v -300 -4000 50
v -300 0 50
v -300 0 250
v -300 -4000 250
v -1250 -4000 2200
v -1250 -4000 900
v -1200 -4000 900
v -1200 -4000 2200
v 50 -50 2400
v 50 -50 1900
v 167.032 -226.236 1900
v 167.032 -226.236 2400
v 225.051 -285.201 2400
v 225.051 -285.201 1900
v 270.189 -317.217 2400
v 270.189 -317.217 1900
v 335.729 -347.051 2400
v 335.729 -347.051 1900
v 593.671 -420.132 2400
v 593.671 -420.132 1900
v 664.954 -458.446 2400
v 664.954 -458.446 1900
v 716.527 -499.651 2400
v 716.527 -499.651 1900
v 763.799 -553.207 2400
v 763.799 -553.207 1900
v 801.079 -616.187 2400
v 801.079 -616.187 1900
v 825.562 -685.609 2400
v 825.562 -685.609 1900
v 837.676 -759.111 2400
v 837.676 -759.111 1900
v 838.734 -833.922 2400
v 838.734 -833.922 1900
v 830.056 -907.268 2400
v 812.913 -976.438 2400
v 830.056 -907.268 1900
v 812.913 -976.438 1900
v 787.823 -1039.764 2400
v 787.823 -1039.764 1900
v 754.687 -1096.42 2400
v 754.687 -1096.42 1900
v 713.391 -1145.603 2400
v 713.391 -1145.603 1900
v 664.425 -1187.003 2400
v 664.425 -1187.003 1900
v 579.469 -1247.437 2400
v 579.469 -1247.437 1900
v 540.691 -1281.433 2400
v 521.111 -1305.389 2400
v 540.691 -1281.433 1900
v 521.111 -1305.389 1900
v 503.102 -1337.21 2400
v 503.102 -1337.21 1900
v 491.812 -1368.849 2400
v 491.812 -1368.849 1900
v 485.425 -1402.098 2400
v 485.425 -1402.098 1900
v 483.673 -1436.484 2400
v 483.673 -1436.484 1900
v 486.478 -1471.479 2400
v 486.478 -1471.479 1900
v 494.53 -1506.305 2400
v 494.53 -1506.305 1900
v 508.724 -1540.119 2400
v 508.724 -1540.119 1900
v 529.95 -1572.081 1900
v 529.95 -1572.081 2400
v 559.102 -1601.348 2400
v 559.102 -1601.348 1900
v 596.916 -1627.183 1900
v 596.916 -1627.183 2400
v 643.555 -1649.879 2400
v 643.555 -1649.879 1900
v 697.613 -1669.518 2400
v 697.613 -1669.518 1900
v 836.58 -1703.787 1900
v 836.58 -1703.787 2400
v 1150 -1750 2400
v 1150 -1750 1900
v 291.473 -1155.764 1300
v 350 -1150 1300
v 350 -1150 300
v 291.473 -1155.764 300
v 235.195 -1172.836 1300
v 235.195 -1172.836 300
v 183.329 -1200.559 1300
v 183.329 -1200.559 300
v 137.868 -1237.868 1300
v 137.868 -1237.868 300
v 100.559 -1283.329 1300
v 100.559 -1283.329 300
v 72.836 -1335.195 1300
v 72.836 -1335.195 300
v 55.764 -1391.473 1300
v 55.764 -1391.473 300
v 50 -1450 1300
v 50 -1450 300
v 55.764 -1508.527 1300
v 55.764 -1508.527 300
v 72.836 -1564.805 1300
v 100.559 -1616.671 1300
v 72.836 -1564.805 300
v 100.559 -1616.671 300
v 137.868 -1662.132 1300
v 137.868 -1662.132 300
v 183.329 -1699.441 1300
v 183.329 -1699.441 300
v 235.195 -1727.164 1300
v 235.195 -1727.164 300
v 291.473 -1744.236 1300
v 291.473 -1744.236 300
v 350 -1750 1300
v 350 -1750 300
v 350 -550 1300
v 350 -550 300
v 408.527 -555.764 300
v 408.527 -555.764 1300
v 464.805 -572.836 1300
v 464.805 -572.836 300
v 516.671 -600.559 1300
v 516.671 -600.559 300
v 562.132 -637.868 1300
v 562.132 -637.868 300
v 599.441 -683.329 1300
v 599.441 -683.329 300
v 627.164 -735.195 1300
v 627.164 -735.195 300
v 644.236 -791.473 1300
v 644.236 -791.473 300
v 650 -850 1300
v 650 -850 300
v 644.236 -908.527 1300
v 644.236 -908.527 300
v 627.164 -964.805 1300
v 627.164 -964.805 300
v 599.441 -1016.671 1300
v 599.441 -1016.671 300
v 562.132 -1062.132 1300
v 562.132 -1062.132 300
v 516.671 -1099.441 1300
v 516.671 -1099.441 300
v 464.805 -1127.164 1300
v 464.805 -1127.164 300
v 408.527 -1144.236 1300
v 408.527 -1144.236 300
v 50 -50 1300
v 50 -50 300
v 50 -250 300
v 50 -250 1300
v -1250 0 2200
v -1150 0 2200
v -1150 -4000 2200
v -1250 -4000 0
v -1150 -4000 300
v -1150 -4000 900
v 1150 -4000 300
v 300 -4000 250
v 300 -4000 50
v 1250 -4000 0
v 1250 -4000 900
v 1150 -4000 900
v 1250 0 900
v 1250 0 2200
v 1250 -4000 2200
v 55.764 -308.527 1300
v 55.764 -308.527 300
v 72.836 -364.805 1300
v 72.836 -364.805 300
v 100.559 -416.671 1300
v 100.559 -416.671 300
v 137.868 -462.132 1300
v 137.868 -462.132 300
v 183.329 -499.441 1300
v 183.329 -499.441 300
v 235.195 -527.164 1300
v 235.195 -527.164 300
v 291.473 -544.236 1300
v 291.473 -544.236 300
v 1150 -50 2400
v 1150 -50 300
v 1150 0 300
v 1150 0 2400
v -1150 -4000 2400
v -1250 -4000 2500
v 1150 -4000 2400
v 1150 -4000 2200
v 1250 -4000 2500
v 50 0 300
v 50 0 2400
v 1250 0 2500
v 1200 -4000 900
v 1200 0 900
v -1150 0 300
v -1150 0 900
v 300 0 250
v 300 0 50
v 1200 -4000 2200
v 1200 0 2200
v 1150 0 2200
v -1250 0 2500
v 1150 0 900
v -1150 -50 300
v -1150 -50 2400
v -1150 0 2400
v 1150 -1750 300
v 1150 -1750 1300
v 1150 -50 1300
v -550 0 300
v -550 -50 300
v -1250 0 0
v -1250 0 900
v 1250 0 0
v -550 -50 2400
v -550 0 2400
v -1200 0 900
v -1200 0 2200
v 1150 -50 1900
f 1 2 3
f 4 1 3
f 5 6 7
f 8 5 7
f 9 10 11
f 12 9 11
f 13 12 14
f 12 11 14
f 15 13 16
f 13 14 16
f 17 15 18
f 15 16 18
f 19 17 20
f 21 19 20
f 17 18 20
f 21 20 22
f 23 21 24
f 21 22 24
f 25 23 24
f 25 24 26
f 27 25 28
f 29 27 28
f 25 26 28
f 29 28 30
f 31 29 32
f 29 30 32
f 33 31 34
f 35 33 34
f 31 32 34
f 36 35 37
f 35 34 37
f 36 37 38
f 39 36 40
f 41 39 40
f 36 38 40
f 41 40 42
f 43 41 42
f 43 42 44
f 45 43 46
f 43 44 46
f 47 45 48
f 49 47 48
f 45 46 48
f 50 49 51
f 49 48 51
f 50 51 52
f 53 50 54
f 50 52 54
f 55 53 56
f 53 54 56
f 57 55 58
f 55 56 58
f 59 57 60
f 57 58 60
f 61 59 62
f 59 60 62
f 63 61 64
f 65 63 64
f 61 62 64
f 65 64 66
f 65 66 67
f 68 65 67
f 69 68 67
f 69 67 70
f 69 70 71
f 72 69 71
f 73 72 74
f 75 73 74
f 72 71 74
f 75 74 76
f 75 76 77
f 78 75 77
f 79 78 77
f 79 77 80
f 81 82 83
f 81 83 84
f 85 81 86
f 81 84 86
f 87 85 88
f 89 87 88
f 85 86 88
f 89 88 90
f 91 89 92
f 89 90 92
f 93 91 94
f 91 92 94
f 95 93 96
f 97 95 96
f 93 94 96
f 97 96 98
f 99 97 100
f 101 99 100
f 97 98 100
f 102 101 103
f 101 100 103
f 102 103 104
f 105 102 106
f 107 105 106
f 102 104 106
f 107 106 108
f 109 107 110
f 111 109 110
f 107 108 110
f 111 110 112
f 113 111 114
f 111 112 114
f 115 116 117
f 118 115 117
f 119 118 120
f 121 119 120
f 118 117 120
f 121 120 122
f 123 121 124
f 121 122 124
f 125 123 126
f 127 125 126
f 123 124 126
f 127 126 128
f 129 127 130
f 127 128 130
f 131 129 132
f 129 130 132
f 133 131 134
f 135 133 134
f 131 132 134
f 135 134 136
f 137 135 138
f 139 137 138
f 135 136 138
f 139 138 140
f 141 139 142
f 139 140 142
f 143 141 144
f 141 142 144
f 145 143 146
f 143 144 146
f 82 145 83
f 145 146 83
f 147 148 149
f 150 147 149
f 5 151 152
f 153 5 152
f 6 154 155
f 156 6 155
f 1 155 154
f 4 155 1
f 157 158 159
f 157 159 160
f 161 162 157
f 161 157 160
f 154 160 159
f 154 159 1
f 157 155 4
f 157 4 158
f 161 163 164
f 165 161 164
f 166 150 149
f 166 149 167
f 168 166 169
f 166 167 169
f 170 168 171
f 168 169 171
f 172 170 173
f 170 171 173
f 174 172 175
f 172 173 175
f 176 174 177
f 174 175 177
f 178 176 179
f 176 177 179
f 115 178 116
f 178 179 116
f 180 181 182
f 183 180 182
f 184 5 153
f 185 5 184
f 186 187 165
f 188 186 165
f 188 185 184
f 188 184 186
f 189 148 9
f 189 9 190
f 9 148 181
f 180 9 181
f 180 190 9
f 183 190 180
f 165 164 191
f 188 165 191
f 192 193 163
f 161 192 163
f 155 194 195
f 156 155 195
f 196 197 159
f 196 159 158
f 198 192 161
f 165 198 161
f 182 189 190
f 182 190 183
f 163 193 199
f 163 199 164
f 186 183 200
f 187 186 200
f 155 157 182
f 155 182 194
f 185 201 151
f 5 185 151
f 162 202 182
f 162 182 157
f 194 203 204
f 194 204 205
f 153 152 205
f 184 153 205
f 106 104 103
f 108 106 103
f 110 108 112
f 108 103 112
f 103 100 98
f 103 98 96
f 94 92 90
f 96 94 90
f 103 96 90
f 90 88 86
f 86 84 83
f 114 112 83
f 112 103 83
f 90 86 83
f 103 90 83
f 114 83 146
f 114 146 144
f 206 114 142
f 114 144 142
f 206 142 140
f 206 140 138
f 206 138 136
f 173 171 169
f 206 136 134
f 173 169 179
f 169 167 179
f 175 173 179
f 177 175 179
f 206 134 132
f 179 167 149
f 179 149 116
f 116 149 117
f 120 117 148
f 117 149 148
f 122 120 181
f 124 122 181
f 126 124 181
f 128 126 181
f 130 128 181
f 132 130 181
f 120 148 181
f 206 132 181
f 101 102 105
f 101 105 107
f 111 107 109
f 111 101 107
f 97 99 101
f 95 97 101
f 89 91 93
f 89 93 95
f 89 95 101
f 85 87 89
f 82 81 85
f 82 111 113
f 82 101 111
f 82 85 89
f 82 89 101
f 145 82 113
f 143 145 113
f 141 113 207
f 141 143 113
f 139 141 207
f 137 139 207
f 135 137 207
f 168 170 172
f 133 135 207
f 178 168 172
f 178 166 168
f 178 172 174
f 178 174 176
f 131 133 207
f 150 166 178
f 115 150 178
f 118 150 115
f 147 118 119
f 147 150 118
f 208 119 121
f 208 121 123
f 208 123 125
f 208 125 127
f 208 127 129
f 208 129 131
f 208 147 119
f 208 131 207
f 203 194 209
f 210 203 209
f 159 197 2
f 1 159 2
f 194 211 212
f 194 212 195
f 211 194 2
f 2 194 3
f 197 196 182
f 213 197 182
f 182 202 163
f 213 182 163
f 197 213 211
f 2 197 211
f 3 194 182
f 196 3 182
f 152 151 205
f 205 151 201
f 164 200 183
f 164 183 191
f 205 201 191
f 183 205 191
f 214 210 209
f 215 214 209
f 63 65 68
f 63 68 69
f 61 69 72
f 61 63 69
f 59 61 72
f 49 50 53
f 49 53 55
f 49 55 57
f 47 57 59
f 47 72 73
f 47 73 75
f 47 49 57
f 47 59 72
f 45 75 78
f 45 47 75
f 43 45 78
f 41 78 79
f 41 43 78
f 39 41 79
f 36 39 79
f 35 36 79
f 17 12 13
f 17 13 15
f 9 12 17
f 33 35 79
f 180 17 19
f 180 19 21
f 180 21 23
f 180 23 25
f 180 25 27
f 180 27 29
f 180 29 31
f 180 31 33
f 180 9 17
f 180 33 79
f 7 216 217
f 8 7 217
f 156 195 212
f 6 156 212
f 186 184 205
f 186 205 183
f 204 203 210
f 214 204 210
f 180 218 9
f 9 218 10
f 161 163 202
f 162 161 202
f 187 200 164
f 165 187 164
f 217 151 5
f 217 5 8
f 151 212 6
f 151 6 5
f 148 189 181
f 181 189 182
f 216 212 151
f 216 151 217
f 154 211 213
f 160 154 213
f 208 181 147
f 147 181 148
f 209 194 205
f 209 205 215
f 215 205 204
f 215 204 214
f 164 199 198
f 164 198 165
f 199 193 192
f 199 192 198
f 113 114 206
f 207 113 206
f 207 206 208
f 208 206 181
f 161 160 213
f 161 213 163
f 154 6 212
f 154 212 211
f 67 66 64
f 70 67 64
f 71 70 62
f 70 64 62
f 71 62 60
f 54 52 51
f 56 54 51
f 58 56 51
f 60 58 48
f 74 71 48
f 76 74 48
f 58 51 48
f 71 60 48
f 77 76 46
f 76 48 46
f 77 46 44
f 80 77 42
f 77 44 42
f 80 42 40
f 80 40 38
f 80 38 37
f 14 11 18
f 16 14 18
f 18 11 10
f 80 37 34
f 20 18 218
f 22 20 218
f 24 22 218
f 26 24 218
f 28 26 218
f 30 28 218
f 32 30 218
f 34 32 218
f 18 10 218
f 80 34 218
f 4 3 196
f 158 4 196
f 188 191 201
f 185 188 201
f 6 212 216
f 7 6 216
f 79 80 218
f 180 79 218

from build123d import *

# Parameters (mm, degrees)
F0_W      = 850
F0_H      = 200
F1_DEPTH  = 4000
F0_W_2    = 50
F0_H_2    = 1300
F2_DEPTH  = 4000
F3_DEPTH  = 24
F4_W      = 600
F4_H      = 50
F5_DEPTH  = 2100
F4_W_2    = 1100
F7_DEPTH  = 1000
F9_DEPTH  = 600
F11_DEPTH = 500


with BuildPart() as f1:
    # F0 (on Front) → F1 (new body)
    with BuildSketch(Plane.XZ):
        Polygon((-1250, 0), (0, 0), (1250, 0), (1250, 900), (1200, 900), (1150, 900), (1150, 324), (1150, 250), (1150, 50), (300, 50), (-300, 50), (-1150, 50), (-1150, 250), (-1150, 324), (-1150, 900), (-1200, 900), (-1250, 900), align=None)
        with Locations((725, 150)):
            Rectangle(F0_W, F0_H)
        with Locations((-725, 150)):
            Rectangle(F0_W, F0_H)
        Polygon((1150, 250), (1150, 324), (-1150, 324), (-1150, 250), (-300, 250), (300, 250), align=None)
    extrude(amount=F1_DEPTH)

    # F3 (cut): a face of the model
    f3_faces = [f1.faces().sort_by_distance(p)[0] for p in [
        (0, -2000, 324),
    ]]
    extrude(f3_faces, amount=-F3_DEPTH, mode=Mode.SUBTRACT)


with BuildPart() as f1b:
    # F0 (on Front) → F1, piece 2 (new body)
    with BuildSketch(Plane.XZ):
        Polygon((1200, 2200), (1250, 2200), (1250, 2500), (-1250, 2500), (-1250, 2200), (-1200, 2200), (-1150, 2200), (-1150, 2400), (1150, 2400), (1150, 2200), align=None)
    extrude(amount=F1_DEPTH)


with BuildPart() as f2:
    # F0 (on Front) → F2 (new body)
    with BuildSketch(Plane.XZ):
        with Locations((-1225, 1550)):
            Rectangle(F0_W_2, F0_H_2)
    extrude(amount=F2_DEPTH)


with BuildPart() as f2b:
    # F0 (on Front) → F2, piece 2 (new body)
    with BuildSketch(Plane.XZ):
        with Locations((1225, 1550)):
            Rectangle(F0_W_2, F0_H_2)
    extrude(amount=F2_DEPTH)


with BuildPart() as f5:
    # F4 (on face) → F5 (new body)
    with BuildSketch(Plane.XY.offset(300)):
        with Locations((-850, -25)):
            Rectangle(F4_W, F4_H)
    extrude(amount=F5_DEPTH)


with BuildPart() as f5b:
    # F4 (on face) → F5, piece 2 (new body)
    with BuildSketch(Plane.XY.offset(300)):
        with Locations((600, -25)):
            Rectangle(F4_W_2, F4_H)
    extrude(amount=F5_DEPTH)


with BuildPart() as f7:
    # F6 (on face) → F7 (new body)
    with BuildSketch(Plane.XY.offset(300)):
        with BuildLine():
            ThreePointArc((350.0000006451, -550), (562.1320345841, -637.8679658721), (650, -850))
            ThreePointArc((650, -850), (562.132034356, -1062.132034356), (350, -1150))
            ThreePointArc((350, -1150), (562.132034356, -1237.867965644), (650, -1450))
            ThreePointArc((650, -1450), (562.132034356, -1662.132034356), (350, -1750))
            Line((350, -1750), (1150, -1750))
            Line((1150, -1750), (1150, -50))
            Line((1150, -50), (573.60679775, -50))
            ThreePointArc((573.60679775, -50), (630.2517076888, -142.9533730681), (650, -250))
            ThreePointArc((650, -250), (562.132034584, -462.1320341279), (350.0000006451, -550))
        make_face()
        with BuildLine():
            ThreePointArc((650, -1450), (562.132034356, -1237.867965644), (350, -1150))
            ThreePointArc((350, -1150), (50, -1450), (350, -1750))
            ThreePointArc((350, -1750), (562.132034356, -1662.132034356), (650, -1450))
        make_face()
        with BuildLine():
            ThreePointArc((50, -250), (137.8679658721, -462.1320345841), (350.0000006451, -550))
            ThreePointArc((350.0000006451, -550), (562.132034584, -462.1320341279), (650, -250))
            ThreePointArc((650, -250), (630.2517076888, -142.9533730681), (573.60679775, -50))
            Line((573.60679775, -50), (126.39320225, -50))
            ThreePointArc((126.39320225, -50), (69.7482923112, -142.9533730681), (50, -250))
        make_face()
        with BuildLine():
            Line((50, -50), (50, -250))
            ThreePointArc((50, -250), (69.7482923112, -142.9533730681), (126.39320225, -50))
            Line((126.39320225, -50), (50, -50))
        make_face()
    extrude(amount=F7_DEPTH)


with BuildPart() as f9:
    # F8 (on face) → F9 (new body)
    with BuildSketch(Plane.XY.offset(1300)):
        with BuildLine():
            ThreePointArc((50, -250), (137.8679658721, -462.1320345841), (350.0000006451, -550))
            ThreePointArc((350.0000006451, -550), (650, -850.0000003226), (350, -1150))
            ThreePointArc((350, -1150), (50, -1450), (350, -1750))
            Line((350, -1750), (1150, -1750))
            Line((1150, -1750), (1150, -50))
            Line((1150, -50), (50, -50))
            Line((50, -50), (50, -250))
        make_face()
    extrude(amount=F9_DEPTH)


with BuildPart() as f11:
    # F10 (on face) → F11 (new body)
    with BuildSketch(Plane.XY.offset(1900)):
        with BuildLine():
            Line((1150, -50), (50, -50))
            add(Edge.make_bspline(
                [(50, -50), (113.2554549854, -156.6305603234), (239.04006967, -368.6673553634), (612.351433458, -381.5232642853), (847.1411136261, -616.0200329402), (846.6562743178, -941.398651859), (727.2759144798, -1168.4686969846), (516.6776333738, -1267.5470144766), (465.8033677392, -1439.2853578448), (541.7568834276, -1673.1610446208), (912.4735460433, -1719.9934383149), (1150, -1750)],
                knots=[0, 0, 0, 0, 0.1219327069, 0.2424653898, 0.3553562562, 0.4693066088, 0.5718978543, 0.6679916823, 0.750103704, 0.8398858562, 1, 1, 1, 1], degree=3))
            Line((1150, -1750), (1150, -50))
        make_face()
    extrude(amount=F11_DEPTH)


solid = Compound([f1.part, f1b.part, f2.part, f2b.part, f5.part, f5b.part, f7.part, f11.part])
